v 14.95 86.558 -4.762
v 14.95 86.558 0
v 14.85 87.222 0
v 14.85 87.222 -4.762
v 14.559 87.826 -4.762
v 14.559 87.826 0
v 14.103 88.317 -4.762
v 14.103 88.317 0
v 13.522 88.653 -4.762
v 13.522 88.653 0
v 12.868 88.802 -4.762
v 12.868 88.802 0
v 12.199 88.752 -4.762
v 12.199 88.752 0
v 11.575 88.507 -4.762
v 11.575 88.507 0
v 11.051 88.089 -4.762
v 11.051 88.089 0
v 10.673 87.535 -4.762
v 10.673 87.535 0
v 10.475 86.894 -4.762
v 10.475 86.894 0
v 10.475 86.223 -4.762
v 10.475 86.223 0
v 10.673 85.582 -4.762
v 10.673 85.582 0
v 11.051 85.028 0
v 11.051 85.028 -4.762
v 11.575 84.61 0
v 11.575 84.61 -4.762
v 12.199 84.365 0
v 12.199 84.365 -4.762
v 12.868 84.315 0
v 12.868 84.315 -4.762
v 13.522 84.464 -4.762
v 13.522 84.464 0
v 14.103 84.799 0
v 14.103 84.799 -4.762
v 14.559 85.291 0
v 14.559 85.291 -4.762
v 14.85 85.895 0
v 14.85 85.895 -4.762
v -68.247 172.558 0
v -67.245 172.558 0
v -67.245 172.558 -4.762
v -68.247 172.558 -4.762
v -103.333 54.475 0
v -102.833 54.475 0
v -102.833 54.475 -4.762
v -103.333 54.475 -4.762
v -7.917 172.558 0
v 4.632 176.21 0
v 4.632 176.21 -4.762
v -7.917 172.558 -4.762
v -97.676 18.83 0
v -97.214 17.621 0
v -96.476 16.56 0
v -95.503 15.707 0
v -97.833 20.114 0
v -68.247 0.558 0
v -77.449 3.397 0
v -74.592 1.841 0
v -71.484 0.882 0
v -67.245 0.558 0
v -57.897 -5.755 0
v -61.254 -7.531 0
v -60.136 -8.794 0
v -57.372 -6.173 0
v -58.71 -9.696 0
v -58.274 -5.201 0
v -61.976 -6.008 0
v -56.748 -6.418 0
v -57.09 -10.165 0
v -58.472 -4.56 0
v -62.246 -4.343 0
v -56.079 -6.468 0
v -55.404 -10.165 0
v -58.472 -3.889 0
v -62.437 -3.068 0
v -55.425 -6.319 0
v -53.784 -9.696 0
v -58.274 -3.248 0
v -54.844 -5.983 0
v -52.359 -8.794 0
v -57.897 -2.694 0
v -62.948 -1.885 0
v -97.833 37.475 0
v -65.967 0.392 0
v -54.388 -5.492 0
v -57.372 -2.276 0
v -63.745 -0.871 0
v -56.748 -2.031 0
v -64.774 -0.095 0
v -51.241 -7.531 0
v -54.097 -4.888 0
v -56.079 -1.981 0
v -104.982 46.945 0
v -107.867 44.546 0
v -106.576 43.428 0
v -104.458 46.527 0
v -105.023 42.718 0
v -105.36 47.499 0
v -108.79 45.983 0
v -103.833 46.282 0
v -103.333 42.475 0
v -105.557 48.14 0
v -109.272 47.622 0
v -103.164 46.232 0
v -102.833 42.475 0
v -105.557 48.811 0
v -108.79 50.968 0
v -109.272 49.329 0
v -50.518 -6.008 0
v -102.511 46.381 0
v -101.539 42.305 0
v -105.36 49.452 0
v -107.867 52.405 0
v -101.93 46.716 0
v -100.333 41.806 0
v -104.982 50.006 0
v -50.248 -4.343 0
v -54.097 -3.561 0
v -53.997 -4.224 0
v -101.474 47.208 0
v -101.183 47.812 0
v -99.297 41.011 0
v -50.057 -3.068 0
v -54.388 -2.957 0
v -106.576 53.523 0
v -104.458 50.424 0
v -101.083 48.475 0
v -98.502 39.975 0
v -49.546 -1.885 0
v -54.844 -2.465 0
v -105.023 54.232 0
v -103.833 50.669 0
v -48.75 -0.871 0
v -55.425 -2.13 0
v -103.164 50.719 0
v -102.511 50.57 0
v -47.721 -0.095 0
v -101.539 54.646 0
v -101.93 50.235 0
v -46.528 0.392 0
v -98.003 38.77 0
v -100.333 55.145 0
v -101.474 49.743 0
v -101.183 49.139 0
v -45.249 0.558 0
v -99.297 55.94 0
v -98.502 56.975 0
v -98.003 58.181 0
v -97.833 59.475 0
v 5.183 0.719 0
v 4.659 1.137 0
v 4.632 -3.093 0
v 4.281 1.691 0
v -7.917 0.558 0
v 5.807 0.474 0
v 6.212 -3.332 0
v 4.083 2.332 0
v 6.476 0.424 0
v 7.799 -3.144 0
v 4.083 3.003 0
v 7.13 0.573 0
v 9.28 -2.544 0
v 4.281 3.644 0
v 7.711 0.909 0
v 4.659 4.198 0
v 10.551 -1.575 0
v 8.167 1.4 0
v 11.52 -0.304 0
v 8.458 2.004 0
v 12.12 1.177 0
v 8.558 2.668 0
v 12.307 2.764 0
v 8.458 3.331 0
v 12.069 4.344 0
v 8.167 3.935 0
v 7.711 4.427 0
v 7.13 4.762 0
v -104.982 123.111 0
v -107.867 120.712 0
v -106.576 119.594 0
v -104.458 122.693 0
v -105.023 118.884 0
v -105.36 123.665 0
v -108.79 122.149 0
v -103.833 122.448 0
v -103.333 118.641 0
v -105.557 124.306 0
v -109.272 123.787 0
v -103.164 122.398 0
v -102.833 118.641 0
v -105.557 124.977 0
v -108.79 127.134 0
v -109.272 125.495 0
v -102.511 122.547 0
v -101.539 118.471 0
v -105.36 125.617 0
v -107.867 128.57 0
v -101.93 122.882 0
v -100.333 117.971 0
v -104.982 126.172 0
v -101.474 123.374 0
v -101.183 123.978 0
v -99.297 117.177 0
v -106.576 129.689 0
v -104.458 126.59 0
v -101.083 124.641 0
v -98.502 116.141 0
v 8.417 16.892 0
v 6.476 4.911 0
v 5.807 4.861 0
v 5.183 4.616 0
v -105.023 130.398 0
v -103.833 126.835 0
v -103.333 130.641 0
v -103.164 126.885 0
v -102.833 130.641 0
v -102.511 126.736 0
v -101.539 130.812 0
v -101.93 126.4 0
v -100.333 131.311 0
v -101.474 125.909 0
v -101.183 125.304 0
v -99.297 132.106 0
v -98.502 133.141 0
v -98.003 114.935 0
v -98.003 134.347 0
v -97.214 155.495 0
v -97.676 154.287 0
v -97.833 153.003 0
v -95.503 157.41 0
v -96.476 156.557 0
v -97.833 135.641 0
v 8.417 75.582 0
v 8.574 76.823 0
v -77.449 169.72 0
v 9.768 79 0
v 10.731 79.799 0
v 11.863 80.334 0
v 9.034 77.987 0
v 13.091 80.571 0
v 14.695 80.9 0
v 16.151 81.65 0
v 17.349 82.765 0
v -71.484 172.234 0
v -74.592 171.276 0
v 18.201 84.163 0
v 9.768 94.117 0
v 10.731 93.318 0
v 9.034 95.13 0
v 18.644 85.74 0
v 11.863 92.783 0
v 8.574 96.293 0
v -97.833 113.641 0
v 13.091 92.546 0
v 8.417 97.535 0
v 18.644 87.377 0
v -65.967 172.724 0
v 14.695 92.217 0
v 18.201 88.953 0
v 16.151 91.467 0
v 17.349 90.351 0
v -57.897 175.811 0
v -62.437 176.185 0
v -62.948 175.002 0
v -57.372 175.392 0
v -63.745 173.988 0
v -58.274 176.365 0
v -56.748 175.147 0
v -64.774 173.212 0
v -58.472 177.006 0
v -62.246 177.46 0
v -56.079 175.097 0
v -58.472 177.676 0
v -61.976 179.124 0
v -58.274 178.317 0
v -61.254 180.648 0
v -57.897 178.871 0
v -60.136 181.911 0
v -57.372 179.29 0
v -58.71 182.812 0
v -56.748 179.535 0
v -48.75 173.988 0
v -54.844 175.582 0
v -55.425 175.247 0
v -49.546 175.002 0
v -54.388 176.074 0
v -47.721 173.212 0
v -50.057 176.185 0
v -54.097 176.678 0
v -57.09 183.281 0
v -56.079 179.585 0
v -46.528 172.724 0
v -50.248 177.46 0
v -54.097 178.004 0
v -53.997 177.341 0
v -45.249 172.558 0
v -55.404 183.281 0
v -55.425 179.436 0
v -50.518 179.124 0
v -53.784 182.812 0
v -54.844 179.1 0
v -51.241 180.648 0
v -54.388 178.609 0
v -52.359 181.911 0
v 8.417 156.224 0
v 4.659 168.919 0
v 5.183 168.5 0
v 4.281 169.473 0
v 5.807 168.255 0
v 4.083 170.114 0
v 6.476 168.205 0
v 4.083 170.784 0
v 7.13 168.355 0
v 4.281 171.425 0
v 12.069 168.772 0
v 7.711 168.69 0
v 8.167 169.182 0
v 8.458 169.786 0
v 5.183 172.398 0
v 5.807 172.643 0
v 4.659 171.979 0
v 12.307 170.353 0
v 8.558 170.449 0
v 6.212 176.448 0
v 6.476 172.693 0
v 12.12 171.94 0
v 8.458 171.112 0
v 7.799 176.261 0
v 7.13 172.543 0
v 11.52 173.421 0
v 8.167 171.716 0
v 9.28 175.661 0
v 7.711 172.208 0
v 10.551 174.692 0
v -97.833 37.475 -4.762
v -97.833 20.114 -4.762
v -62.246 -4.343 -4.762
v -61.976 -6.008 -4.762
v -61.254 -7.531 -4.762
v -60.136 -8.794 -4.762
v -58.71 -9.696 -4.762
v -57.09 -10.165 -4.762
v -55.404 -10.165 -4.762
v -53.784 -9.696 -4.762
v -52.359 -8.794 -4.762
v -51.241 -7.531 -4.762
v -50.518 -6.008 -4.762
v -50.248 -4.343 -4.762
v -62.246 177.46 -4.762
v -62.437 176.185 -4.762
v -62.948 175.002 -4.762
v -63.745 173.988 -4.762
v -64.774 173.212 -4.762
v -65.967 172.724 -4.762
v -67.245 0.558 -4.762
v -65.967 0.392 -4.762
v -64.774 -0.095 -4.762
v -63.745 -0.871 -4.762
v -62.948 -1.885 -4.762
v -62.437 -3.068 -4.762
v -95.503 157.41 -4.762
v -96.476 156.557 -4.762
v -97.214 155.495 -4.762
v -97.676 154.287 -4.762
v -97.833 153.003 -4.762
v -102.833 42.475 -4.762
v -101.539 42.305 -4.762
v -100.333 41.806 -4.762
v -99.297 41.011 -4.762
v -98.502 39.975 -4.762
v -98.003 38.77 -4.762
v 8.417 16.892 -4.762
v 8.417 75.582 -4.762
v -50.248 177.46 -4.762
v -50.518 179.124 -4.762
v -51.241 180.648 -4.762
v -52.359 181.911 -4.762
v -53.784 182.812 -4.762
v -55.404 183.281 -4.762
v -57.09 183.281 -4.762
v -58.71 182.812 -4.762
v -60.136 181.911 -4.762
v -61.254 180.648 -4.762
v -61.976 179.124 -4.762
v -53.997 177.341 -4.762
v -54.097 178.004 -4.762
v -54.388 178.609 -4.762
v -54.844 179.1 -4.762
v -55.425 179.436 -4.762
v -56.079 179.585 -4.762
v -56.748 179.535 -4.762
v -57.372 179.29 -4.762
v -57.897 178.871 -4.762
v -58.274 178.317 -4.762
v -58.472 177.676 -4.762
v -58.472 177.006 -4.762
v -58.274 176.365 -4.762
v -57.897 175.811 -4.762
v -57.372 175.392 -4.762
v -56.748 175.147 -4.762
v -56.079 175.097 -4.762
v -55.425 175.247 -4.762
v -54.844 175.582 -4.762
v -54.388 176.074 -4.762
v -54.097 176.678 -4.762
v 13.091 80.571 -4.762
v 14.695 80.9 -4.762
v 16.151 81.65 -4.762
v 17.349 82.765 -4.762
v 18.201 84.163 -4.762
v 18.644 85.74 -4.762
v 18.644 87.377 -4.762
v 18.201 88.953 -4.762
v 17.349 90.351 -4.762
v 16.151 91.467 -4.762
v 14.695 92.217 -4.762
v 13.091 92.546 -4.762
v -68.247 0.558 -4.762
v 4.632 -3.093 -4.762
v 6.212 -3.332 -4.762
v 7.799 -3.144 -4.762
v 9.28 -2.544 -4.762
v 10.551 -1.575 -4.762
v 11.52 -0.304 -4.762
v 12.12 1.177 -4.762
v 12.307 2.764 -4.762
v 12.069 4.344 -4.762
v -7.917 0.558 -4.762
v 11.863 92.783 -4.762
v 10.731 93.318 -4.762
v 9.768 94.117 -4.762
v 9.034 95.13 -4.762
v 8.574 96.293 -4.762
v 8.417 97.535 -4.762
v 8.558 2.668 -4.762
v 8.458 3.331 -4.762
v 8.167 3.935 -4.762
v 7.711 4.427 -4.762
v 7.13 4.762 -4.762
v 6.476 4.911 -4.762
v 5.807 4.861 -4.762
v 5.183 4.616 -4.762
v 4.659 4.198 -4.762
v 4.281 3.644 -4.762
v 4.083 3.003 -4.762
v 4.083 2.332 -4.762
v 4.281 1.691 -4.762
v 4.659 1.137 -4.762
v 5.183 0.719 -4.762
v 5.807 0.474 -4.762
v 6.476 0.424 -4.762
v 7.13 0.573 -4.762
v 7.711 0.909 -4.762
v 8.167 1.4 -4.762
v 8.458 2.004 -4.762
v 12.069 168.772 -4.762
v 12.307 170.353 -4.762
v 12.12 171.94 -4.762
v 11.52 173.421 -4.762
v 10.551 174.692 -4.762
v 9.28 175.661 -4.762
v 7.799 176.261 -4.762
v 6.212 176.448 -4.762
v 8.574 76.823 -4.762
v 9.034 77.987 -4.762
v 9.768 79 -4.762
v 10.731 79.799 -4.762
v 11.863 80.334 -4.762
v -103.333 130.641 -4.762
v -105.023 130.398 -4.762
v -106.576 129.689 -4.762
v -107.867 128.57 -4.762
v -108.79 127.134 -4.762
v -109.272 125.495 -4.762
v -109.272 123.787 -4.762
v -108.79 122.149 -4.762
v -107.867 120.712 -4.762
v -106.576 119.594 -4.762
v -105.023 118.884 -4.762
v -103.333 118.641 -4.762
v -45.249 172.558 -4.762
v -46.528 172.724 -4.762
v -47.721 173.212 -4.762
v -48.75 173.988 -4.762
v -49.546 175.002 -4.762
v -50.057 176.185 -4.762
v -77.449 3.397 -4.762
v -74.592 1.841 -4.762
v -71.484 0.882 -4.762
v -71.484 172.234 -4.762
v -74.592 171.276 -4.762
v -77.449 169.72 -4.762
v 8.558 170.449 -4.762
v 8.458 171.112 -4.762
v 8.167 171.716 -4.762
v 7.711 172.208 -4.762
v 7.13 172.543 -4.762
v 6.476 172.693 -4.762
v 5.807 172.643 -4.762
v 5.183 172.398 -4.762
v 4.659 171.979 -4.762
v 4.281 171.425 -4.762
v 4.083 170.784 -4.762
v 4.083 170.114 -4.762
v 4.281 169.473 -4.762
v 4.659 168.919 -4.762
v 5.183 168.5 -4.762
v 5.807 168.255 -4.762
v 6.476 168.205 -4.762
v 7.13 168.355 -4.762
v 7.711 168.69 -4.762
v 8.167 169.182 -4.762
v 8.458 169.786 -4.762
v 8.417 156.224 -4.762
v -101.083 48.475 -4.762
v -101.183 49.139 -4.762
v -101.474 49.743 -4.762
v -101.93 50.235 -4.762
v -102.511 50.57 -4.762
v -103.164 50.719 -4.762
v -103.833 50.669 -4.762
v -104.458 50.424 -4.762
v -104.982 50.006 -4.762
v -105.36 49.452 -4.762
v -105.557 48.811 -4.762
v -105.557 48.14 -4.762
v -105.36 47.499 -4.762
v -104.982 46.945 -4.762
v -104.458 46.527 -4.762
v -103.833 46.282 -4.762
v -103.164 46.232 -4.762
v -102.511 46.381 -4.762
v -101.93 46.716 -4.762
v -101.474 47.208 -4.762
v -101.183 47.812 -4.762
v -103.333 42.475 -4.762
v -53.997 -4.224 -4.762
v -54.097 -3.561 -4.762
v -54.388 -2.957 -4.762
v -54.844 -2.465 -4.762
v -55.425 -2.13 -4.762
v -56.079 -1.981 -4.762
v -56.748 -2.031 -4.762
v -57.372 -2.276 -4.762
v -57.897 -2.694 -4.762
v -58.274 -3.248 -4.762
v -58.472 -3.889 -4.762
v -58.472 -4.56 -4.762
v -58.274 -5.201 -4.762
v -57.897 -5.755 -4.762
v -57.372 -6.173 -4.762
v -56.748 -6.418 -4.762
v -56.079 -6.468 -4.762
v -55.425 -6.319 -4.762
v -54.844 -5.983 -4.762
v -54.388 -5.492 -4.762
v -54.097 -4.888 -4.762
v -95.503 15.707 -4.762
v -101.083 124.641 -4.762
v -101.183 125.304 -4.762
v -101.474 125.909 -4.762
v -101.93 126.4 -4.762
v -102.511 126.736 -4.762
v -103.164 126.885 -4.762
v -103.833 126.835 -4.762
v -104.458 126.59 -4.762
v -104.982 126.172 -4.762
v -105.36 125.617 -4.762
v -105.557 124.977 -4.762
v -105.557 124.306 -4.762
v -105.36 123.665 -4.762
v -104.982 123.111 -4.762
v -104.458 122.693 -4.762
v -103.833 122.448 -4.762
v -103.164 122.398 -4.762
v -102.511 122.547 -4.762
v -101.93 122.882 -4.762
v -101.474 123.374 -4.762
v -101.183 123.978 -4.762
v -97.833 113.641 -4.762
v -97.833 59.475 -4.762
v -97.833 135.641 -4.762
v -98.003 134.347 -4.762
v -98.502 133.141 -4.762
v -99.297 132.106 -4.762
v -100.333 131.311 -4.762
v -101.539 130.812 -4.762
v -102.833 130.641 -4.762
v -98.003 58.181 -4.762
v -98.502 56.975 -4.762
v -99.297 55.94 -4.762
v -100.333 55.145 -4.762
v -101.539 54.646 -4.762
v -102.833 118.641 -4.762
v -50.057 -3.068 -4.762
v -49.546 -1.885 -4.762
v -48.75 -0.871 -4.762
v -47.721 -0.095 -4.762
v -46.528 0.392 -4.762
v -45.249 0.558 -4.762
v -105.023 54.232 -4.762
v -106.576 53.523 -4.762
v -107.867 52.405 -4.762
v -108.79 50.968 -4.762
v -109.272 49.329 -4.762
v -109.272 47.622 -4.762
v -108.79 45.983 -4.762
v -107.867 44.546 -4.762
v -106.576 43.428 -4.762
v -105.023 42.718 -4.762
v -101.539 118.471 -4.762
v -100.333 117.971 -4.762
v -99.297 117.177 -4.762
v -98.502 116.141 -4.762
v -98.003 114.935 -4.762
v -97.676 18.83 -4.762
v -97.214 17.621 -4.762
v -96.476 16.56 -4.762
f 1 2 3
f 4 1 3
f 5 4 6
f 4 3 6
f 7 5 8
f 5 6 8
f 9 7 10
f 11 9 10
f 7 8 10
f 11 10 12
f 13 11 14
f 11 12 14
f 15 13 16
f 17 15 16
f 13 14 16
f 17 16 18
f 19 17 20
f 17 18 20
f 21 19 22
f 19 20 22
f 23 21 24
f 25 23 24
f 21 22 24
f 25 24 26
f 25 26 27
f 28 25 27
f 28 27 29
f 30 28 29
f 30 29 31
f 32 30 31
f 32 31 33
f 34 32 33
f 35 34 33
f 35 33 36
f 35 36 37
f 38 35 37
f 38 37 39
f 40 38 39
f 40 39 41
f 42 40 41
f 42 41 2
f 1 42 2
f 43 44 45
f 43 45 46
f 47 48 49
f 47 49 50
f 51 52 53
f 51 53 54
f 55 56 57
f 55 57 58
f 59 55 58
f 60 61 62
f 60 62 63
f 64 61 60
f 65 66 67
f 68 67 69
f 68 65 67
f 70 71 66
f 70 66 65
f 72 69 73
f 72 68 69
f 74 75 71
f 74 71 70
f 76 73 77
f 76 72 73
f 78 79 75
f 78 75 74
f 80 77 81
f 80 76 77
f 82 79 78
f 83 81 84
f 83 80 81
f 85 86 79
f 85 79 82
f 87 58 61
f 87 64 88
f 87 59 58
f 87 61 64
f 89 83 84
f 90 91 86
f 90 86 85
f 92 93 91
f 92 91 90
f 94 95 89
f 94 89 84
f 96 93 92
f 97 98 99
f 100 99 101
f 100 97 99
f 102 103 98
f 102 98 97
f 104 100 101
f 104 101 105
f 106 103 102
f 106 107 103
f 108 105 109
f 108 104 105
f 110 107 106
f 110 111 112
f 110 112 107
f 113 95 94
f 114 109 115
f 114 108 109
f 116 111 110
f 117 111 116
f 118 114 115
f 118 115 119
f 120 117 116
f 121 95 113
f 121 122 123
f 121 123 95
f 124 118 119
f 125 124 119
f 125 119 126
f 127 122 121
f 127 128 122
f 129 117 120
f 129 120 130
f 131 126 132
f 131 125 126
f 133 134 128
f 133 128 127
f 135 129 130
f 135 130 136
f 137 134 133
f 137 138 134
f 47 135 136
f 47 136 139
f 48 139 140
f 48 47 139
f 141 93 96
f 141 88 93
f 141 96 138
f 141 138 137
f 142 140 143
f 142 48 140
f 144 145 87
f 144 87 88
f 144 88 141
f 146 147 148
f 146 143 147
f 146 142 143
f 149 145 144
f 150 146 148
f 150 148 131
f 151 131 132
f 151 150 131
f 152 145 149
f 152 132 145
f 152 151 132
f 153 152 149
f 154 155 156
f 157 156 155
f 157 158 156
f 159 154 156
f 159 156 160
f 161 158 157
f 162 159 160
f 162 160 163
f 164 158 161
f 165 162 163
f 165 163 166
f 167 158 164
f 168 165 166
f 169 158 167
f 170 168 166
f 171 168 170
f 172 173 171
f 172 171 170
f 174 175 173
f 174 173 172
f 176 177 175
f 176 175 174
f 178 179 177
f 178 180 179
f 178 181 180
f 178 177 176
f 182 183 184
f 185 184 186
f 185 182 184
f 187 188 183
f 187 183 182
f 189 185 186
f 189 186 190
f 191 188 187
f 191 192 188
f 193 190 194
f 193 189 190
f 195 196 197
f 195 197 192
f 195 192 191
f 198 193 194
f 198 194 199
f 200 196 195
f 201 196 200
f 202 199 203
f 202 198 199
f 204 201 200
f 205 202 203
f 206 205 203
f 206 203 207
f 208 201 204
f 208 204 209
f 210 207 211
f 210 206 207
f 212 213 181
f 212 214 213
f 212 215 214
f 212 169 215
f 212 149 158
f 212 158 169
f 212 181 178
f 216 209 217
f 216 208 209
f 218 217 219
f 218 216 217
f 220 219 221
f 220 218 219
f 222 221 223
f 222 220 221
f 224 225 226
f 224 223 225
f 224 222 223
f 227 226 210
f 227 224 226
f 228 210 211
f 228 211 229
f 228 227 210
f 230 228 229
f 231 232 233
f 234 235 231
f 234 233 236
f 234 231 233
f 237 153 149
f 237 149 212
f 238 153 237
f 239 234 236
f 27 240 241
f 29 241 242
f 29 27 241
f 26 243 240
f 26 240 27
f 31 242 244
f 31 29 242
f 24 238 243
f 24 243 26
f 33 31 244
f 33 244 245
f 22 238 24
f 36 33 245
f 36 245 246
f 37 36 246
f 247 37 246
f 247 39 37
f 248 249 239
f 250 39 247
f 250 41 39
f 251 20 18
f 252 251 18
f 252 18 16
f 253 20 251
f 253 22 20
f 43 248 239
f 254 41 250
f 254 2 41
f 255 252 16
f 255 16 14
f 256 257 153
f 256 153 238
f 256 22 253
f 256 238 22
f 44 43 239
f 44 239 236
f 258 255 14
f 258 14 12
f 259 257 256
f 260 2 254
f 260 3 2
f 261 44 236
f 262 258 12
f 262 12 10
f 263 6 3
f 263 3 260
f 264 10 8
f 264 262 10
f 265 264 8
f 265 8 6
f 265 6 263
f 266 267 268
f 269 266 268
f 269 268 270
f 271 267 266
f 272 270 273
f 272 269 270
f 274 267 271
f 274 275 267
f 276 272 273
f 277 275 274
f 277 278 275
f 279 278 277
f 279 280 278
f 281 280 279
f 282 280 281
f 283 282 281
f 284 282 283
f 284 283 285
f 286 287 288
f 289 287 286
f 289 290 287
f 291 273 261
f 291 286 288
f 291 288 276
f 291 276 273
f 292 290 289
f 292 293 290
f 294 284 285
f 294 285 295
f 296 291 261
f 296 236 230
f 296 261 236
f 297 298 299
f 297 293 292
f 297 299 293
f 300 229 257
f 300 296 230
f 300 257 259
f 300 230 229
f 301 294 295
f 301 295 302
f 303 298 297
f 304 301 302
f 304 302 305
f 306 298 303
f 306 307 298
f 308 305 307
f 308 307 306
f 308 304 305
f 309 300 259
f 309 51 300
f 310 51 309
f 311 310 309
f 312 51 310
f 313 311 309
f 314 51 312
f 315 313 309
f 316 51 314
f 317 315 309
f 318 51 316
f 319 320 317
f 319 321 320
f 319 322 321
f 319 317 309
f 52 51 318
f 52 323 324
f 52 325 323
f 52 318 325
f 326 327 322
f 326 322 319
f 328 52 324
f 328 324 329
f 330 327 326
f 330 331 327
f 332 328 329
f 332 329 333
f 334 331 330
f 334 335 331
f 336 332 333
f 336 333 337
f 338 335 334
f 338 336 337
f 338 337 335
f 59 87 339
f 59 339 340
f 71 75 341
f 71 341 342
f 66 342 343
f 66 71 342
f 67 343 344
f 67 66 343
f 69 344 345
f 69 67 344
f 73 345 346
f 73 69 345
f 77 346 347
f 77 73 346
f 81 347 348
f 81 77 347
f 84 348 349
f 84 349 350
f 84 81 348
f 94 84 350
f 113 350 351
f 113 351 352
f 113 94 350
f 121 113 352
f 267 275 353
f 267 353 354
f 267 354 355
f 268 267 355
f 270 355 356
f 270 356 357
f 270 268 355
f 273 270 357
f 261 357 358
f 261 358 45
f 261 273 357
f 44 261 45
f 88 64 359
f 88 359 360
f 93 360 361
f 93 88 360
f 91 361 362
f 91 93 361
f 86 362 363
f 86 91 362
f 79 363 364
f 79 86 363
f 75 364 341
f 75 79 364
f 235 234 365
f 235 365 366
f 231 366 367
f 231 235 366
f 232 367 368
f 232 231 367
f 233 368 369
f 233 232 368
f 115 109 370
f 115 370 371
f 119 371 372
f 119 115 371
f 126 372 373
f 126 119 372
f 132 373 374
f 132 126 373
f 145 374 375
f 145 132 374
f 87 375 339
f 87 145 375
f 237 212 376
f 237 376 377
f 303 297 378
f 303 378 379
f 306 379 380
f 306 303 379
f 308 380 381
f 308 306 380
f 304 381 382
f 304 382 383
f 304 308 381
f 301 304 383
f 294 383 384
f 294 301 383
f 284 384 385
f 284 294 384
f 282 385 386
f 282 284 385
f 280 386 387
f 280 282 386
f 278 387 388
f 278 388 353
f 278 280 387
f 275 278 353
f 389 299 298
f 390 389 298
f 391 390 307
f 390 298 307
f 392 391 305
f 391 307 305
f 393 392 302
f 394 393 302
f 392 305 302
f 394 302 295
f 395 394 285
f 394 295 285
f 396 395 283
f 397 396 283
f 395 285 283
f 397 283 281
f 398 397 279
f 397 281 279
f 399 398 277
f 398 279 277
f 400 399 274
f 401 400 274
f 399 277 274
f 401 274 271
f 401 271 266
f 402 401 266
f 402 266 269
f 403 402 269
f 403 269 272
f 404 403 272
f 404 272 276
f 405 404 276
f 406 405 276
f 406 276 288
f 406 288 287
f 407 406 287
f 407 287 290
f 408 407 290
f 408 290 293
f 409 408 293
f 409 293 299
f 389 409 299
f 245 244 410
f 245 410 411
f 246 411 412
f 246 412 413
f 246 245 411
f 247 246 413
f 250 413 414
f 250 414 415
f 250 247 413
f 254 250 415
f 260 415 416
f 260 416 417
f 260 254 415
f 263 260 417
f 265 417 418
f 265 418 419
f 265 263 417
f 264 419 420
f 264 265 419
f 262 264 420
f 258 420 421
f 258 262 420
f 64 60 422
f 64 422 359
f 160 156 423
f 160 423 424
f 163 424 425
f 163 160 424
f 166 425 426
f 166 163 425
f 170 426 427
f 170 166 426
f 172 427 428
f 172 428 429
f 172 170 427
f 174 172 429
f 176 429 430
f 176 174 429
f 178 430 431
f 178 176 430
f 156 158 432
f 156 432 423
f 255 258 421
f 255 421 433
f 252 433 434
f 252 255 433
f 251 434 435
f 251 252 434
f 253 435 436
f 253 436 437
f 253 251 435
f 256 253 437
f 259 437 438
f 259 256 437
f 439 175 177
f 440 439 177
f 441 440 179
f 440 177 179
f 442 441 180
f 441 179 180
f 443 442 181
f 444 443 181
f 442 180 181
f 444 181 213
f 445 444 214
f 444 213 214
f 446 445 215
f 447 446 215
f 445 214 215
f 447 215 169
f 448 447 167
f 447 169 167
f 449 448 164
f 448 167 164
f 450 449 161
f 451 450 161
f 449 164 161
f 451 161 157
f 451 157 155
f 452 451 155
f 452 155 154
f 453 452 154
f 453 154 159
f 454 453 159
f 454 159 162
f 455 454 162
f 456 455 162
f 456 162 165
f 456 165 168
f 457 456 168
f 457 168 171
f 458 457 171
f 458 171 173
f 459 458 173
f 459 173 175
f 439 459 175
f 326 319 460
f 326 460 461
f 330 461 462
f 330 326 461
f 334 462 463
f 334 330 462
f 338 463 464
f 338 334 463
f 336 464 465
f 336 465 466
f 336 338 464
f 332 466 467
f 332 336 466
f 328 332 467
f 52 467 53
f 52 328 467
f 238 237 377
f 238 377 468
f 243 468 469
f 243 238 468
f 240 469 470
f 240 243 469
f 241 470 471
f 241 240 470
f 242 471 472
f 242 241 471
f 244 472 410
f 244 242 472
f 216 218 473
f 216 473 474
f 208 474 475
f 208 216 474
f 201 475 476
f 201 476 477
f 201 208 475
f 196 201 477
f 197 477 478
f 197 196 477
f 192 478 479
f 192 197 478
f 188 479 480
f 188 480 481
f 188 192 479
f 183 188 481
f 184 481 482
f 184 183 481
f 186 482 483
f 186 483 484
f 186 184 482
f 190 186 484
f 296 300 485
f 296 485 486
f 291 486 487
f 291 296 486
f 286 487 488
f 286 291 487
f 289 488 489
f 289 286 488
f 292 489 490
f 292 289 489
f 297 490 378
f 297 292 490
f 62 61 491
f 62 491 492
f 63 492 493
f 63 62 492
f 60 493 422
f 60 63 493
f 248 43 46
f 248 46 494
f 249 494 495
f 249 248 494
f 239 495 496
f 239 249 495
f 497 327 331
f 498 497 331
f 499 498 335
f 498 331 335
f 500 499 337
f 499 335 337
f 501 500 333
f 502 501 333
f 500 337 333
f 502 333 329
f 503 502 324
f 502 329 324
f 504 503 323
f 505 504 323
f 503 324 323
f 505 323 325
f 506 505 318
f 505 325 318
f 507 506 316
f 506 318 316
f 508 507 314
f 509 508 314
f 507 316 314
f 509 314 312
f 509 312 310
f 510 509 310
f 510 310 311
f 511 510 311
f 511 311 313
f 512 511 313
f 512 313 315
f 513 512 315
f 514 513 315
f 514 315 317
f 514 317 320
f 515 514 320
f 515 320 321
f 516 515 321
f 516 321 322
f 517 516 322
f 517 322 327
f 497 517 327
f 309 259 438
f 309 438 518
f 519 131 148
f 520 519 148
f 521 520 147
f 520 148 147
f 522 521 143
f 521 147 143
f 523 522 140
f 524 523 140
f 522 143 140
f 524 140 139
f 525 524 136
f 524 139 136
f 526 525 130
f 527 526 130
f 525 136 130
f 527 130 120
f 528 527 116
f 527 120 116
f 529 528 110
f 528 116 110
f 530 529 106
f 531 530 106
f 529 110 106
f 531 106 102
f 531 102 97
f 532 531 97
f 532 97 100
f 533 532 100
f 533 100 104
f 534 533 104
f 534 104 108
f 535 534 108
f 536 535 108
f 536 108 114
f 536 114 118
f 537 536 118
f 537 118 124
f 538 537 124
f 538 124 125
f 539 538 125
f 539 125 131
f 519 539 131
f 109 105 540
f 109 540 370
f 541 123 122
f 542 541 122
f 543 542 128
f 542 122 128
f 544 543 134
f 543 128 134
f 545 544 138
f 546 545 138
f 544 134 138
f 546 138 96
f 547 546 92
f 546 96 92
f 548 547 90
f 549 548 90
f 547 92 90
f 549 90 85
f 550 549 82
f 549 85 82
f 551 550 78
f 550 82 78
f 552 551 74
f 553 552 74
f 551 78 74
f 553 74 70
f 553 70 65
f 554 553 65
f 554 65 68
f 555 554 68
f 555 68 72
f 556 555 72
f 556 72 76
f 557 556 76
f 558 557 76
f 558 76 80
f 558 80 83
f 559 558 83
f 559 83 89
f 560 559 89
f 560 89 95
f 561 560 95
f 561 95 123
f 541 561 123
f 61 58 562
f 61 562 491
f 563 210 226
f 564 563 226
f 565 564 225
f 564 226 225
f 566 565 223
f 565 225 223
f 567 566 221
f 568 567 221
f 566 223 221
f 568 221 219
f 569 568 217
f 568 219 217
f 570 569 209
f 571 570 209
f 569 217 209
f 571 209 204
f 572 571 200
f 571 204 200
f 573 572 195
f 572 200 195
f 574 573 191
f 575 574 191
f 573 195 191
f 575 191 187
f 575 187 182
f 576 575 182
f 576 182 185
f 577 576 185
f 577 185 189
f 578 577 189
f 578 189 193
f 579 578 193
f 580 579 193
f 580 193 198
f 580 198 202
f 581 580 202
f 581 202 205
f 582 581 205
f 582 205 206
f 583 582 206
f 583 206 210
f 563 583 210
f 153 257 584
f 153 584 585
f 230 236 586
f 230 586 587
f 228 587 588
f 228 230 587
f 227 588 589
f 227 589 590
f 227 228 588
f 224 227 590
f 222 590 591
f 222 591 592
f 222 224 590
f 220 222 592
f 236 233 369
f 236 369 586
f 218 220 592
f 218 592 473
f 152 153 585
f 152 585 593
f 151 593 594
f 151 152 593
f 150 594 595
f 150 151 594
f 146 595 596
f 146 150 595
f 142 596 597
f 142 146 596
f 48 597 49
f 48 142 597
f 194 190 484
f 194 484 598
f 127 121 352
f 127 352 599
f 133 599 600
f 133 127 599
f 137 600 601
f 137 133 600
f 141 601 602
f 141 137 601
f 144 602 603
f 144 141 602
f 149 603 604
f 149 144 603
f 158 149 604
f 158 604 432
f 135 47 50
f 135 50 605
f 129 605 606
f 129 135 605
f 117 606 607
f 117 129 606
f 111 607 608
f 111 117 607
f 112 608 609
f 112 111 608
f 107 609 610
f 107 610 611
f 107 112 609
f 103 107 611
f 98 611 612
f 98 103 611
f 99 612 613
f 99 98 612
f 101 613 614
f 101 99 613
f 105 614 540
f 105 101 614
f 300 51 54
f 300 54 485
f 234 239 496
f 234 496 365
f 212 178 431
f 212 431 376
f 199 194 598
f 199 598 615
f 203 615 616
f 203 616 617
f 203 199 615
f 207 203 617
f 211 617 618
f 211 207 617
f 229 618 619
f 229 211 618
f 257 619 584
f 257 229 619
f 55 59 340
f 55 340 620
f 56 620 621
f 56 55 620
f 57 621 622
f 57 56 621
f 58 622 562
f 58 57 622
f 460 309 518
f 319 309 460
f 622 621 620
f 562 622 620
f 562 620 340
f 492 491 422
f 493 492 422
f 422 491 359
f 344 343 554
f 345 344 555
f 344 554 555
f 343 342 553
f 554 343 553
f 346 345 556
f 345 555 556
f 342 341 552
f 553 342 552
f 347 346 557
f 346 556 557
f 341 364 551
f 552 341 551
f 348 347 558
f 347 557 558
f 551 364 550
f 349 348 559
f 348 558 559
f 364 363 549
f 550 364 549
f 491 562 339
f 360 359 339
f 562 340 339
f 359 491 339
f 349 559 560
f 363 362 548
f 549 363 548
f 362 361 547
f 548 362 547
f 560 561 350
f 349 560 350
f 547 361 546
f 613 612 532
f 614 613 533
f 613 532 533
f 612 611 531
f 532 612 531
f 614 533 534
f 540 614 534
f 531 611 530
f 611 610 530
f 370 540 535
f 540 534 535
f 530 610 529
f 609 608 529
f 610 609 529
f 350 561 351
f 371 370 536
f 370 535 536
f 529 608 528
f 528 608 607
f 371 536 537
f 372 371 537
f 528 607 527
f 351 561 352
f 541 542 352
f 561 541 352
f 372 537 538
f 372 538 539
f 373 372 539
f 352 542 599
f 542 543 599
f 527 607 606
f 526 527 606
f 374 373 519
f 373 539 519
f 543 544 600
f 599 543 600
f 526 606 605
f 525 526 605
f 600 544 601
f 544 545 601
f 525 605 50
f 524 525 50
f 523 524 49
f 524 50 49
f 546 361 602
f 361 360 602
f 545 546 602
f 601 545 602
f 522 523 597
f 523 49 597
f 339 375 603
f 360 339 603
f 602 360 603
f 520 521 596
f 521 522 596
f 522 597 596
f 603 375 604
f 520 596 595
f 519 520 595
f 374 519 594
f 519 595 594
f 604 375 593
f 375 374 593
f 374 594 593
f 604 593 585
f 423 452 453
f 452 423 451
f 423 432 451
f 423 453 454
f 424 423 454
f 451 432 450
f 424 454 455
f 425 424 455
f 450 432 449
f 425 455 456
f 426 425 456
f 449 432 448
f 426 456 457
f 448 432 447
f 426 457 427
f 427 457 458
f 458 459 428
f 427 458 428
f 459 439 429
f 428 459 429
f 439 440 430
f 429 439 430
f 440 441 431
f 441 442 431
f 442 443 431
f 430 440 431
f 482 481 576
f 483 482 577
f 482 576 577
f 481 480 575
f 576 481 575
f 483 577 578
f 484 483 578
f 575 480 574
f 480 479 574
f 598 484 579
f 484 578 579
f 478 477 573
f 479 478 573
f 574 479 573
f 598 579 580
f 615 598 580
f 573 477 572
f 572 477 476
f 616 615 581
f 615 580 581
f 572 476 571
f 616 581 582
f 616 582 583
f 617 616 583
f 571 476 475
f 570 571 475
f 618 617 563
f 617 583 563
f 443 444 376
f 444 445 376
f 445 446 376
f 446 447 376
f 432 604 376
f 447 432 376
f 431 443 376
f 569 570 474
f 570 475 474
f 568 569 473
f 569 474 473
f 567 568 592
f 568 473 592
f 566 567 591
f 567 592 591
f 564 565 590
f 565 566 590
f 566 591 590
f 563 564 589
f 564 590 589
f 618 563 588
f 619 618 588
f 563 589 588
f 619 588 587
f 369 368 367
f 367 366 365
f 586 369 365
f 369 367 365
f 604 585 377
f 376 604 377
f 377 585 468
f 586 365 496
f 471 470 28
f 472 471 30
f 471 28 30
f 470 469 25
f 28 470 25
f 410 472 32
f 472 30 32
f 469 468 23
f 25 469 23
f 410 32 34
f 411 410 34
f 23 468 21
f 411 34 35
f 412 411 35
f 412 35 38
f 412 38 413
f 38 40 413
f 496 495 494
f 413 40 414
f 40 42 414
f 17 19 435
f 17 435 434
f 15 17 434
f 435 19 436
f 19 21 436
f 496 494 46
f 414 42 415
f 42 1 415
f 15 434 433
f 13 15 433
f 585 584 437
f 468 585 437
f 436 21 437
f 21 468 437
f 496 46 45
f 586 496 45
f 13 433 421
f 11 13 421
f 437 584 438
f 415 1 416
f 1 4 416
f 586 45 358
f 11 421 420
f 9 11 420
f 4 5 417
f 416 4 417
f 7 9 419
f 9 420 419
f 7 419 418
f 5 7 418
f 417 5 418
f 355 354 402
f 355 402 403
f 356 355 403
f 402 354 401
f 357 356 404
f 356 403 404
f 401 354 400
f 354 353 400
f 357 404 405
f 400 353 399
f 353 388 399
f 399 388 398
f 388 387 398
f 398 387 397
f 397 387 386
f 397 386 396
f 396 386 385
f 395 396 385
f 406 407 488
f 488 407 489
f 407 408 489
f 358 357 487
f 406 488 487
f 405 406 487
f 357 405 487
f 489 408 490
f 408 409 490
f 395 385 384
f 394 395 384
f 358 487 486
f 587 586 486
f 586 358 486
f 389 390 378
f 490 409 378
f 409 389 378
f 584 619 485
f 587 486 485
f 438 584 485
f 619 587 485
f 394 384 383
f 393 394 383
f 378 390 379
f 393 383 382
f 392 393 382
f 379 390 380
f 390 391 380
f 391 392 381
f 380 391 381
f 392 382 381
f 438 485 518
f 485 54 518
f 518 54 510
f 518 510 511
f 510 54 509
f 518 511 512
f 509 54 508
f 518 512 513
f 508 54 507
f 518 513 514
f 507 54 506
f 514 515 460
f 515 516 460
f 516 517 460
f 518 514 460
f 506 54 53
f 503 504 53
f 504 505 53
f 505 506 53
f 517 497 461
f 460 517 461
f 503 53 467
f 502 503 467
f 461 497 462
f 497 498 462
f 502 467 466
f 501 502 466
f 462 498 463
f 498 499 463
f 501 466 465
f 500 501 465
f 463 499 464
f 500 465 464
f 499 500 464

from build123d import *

# Parameters (mm, degrees)
BOSS_EXTRUDE1_DEPTH  = 4.7625
M4_CLEARANCE_HOLE1_D = 4.5


with BuildPart() as part:
    # Sketch1 → Boss-Extrude1 (new body)
    with BuildSketch(Plane.XY):
        with BuildLine():
            Line((-97.832602581, 37.475432296), (-97.832602581, 20.113840969))
            ThreePointArc((-97.832602581, 20.113840969), (-97.214499379, 17.621477955), (-95.503441204, 15.706744322))
            Line((-95.503441204, 15.706744322), (-77.448765904, 3.396738436))
            ThreePointArc((-77.448765904, 3.396738436), (-73.061911597, 1.284058495), (-68.247222211, 0.558335853))
            Line((-68.247222211, 0.558335853), (-67.24507567, 0.558335853))
            ThreePointArc((-67.24507567, 0.558335853), (-63.744637386, -0.87137959), (-62.24605137, -4.342891419))
            ThreePointArc((-62.24605137, -4.342891419), (-56.247222211, -10.224364147), (-50.248393051, -4.342891419))
            ThreePointArc((-50.248393051, -4.342891419), (-48.749807036, -0.87137959), (-45.249368751, 0.558335853))
            Line((-45.249368751, 0.558335853), (-7.916602581, 0.558335853))
            Line((-7.916602581, 0.558335853), (4.631523913, -3.09333052))
            ThreePointArc((4.631523913, -3.09333052), (10.550693091, -1.574959819), (12.069063792, 4.344209359))
            Line((12.069063792, 4.344209359), (8.417397419, 16.892335853))
            Line((8.417397419, 16.892335853), (8.417397419, 75.581748009))
            ThreePointArc((8.417397419, 75.581748009), (9.768409389, 79.000064314), (13.091351964, 80.57110612))
            ThreePointArc((13.091351964, 80.57110612), (18.700097419, 86.558335853), (13.091351964, 92.545565587))
            ThreePointArc((13.091351964, 92.545565587), (9.768409389, 94.116607393), (8.417397419, 97.534923698))
            Line((8.417397419, 97.534923698), (8.417397419, 156.224335853))
            Line((8.417397419, 156.224335853), (12.069063792, 168.772462348))
            ThreePointArc((12.069063792, 168.772462348), (10.550693091, 174.691631526), (4.631523913, 176.210002227))
            Line((4.631523913, 176.210002227), (-7.916602581, 172.558335853))
            Line((-7.916602581, 172.558335853), (-45.249368751, 172.558335853))
            ThreePointArc((-45.249368751, 172.558335853), (-48.749807036, 173.988051296), (-50.248393051, 177.459563126))
            ThreePointArc((-50.248393051, 177.459563126), (-56.247222211, 183.341035853), (-62.24605137, 177.459563126))
            ThreePointArc((-62.24605137, 177.459563126), (-63.744637386, 173.988051296), (-67.24507567, 172.558335853))
            Line((-67.24507567, 172.558335853), (-68.247222211, 172.558335853))
            ThreePointArc((-68.247222211, 172.558335853), (-73.061911597, 171.832613212), (-77.448765904, 169.719933271))
            Line((-77.448765904, 169.719933271), (-95.503441204, 157.409927385))
            ThreePointArc((-95.503441204, 157.409927385), (-97.214499379, 155.495193752), (-97.832602581, 153.002830738))
            Line((-97.832602581, 153.002830738), (-97.832602581, 135.641239411))
            ThreePointArc((-97.832602581, 135.641239411), (-99.297068676, 132.105705505), (-102.832602581, 130.641239411))
            Line((-102.832602581, 130.641239411), (-103.332602581, 130.641239411))
            ThreePointArc((-103.332602581, 130.641239411), (-109.332602581, 124.641239411), (-103.332602581, 118.641239411))
            Line((-103.332602581, 118.641239411), (-102.832602581, 118.641239411))
            ThreePointArc((-102.832602581, 118.641239411), (-99.297068676, 117.176773317), (-97.832602581, 113.641239411))
            Line((-97.832602581, 113.641239411), (-97.832602581, 59.475432296))
            ThreePointArc((-97.832602581, 59.475432296), (-99.297068676, 55.93989839), (-102.832602581, 54.475432296))
            Line((-102.832602581, 54.475432296), (-103.332602581, 54.475432296))
            ThreePointArc((-103.332602581, 54.475432296), (-109.332602581, 48.475432296), (-103.332602581, 42.475432296))
            Line((-103.332602581, 42.475432296), (-102.832602581, 42.475432296))
            ThreePointArc((-102.832602581, 42.475432296), (-99.297068676, 41.010966202), (-97.832602581, 37.475432296))
        make_face()
    extrude(amount=-BOSS_EXTRUDE1_DEPTH)

    # M4 Clearance Hole1 (through all)
    with Locations(Plane(origin=(0, 0, -4.7625), x_dir=(-1, 0, 0), z_dir=(0, 0, -1))):
        with Locations((103.332602581, 48.475432296), (56.247222211, -4.224364147), (-12.700097419, 86.558335853), (56.247222211, 177.341035853), (103.332602581, 124.641239411), (-6.308052404, 2.667680868), (-6.308052404, 170.448990839)):
            Hole(M4_CLEARANCE_HOLE1_D / 2)


solid = part.part
